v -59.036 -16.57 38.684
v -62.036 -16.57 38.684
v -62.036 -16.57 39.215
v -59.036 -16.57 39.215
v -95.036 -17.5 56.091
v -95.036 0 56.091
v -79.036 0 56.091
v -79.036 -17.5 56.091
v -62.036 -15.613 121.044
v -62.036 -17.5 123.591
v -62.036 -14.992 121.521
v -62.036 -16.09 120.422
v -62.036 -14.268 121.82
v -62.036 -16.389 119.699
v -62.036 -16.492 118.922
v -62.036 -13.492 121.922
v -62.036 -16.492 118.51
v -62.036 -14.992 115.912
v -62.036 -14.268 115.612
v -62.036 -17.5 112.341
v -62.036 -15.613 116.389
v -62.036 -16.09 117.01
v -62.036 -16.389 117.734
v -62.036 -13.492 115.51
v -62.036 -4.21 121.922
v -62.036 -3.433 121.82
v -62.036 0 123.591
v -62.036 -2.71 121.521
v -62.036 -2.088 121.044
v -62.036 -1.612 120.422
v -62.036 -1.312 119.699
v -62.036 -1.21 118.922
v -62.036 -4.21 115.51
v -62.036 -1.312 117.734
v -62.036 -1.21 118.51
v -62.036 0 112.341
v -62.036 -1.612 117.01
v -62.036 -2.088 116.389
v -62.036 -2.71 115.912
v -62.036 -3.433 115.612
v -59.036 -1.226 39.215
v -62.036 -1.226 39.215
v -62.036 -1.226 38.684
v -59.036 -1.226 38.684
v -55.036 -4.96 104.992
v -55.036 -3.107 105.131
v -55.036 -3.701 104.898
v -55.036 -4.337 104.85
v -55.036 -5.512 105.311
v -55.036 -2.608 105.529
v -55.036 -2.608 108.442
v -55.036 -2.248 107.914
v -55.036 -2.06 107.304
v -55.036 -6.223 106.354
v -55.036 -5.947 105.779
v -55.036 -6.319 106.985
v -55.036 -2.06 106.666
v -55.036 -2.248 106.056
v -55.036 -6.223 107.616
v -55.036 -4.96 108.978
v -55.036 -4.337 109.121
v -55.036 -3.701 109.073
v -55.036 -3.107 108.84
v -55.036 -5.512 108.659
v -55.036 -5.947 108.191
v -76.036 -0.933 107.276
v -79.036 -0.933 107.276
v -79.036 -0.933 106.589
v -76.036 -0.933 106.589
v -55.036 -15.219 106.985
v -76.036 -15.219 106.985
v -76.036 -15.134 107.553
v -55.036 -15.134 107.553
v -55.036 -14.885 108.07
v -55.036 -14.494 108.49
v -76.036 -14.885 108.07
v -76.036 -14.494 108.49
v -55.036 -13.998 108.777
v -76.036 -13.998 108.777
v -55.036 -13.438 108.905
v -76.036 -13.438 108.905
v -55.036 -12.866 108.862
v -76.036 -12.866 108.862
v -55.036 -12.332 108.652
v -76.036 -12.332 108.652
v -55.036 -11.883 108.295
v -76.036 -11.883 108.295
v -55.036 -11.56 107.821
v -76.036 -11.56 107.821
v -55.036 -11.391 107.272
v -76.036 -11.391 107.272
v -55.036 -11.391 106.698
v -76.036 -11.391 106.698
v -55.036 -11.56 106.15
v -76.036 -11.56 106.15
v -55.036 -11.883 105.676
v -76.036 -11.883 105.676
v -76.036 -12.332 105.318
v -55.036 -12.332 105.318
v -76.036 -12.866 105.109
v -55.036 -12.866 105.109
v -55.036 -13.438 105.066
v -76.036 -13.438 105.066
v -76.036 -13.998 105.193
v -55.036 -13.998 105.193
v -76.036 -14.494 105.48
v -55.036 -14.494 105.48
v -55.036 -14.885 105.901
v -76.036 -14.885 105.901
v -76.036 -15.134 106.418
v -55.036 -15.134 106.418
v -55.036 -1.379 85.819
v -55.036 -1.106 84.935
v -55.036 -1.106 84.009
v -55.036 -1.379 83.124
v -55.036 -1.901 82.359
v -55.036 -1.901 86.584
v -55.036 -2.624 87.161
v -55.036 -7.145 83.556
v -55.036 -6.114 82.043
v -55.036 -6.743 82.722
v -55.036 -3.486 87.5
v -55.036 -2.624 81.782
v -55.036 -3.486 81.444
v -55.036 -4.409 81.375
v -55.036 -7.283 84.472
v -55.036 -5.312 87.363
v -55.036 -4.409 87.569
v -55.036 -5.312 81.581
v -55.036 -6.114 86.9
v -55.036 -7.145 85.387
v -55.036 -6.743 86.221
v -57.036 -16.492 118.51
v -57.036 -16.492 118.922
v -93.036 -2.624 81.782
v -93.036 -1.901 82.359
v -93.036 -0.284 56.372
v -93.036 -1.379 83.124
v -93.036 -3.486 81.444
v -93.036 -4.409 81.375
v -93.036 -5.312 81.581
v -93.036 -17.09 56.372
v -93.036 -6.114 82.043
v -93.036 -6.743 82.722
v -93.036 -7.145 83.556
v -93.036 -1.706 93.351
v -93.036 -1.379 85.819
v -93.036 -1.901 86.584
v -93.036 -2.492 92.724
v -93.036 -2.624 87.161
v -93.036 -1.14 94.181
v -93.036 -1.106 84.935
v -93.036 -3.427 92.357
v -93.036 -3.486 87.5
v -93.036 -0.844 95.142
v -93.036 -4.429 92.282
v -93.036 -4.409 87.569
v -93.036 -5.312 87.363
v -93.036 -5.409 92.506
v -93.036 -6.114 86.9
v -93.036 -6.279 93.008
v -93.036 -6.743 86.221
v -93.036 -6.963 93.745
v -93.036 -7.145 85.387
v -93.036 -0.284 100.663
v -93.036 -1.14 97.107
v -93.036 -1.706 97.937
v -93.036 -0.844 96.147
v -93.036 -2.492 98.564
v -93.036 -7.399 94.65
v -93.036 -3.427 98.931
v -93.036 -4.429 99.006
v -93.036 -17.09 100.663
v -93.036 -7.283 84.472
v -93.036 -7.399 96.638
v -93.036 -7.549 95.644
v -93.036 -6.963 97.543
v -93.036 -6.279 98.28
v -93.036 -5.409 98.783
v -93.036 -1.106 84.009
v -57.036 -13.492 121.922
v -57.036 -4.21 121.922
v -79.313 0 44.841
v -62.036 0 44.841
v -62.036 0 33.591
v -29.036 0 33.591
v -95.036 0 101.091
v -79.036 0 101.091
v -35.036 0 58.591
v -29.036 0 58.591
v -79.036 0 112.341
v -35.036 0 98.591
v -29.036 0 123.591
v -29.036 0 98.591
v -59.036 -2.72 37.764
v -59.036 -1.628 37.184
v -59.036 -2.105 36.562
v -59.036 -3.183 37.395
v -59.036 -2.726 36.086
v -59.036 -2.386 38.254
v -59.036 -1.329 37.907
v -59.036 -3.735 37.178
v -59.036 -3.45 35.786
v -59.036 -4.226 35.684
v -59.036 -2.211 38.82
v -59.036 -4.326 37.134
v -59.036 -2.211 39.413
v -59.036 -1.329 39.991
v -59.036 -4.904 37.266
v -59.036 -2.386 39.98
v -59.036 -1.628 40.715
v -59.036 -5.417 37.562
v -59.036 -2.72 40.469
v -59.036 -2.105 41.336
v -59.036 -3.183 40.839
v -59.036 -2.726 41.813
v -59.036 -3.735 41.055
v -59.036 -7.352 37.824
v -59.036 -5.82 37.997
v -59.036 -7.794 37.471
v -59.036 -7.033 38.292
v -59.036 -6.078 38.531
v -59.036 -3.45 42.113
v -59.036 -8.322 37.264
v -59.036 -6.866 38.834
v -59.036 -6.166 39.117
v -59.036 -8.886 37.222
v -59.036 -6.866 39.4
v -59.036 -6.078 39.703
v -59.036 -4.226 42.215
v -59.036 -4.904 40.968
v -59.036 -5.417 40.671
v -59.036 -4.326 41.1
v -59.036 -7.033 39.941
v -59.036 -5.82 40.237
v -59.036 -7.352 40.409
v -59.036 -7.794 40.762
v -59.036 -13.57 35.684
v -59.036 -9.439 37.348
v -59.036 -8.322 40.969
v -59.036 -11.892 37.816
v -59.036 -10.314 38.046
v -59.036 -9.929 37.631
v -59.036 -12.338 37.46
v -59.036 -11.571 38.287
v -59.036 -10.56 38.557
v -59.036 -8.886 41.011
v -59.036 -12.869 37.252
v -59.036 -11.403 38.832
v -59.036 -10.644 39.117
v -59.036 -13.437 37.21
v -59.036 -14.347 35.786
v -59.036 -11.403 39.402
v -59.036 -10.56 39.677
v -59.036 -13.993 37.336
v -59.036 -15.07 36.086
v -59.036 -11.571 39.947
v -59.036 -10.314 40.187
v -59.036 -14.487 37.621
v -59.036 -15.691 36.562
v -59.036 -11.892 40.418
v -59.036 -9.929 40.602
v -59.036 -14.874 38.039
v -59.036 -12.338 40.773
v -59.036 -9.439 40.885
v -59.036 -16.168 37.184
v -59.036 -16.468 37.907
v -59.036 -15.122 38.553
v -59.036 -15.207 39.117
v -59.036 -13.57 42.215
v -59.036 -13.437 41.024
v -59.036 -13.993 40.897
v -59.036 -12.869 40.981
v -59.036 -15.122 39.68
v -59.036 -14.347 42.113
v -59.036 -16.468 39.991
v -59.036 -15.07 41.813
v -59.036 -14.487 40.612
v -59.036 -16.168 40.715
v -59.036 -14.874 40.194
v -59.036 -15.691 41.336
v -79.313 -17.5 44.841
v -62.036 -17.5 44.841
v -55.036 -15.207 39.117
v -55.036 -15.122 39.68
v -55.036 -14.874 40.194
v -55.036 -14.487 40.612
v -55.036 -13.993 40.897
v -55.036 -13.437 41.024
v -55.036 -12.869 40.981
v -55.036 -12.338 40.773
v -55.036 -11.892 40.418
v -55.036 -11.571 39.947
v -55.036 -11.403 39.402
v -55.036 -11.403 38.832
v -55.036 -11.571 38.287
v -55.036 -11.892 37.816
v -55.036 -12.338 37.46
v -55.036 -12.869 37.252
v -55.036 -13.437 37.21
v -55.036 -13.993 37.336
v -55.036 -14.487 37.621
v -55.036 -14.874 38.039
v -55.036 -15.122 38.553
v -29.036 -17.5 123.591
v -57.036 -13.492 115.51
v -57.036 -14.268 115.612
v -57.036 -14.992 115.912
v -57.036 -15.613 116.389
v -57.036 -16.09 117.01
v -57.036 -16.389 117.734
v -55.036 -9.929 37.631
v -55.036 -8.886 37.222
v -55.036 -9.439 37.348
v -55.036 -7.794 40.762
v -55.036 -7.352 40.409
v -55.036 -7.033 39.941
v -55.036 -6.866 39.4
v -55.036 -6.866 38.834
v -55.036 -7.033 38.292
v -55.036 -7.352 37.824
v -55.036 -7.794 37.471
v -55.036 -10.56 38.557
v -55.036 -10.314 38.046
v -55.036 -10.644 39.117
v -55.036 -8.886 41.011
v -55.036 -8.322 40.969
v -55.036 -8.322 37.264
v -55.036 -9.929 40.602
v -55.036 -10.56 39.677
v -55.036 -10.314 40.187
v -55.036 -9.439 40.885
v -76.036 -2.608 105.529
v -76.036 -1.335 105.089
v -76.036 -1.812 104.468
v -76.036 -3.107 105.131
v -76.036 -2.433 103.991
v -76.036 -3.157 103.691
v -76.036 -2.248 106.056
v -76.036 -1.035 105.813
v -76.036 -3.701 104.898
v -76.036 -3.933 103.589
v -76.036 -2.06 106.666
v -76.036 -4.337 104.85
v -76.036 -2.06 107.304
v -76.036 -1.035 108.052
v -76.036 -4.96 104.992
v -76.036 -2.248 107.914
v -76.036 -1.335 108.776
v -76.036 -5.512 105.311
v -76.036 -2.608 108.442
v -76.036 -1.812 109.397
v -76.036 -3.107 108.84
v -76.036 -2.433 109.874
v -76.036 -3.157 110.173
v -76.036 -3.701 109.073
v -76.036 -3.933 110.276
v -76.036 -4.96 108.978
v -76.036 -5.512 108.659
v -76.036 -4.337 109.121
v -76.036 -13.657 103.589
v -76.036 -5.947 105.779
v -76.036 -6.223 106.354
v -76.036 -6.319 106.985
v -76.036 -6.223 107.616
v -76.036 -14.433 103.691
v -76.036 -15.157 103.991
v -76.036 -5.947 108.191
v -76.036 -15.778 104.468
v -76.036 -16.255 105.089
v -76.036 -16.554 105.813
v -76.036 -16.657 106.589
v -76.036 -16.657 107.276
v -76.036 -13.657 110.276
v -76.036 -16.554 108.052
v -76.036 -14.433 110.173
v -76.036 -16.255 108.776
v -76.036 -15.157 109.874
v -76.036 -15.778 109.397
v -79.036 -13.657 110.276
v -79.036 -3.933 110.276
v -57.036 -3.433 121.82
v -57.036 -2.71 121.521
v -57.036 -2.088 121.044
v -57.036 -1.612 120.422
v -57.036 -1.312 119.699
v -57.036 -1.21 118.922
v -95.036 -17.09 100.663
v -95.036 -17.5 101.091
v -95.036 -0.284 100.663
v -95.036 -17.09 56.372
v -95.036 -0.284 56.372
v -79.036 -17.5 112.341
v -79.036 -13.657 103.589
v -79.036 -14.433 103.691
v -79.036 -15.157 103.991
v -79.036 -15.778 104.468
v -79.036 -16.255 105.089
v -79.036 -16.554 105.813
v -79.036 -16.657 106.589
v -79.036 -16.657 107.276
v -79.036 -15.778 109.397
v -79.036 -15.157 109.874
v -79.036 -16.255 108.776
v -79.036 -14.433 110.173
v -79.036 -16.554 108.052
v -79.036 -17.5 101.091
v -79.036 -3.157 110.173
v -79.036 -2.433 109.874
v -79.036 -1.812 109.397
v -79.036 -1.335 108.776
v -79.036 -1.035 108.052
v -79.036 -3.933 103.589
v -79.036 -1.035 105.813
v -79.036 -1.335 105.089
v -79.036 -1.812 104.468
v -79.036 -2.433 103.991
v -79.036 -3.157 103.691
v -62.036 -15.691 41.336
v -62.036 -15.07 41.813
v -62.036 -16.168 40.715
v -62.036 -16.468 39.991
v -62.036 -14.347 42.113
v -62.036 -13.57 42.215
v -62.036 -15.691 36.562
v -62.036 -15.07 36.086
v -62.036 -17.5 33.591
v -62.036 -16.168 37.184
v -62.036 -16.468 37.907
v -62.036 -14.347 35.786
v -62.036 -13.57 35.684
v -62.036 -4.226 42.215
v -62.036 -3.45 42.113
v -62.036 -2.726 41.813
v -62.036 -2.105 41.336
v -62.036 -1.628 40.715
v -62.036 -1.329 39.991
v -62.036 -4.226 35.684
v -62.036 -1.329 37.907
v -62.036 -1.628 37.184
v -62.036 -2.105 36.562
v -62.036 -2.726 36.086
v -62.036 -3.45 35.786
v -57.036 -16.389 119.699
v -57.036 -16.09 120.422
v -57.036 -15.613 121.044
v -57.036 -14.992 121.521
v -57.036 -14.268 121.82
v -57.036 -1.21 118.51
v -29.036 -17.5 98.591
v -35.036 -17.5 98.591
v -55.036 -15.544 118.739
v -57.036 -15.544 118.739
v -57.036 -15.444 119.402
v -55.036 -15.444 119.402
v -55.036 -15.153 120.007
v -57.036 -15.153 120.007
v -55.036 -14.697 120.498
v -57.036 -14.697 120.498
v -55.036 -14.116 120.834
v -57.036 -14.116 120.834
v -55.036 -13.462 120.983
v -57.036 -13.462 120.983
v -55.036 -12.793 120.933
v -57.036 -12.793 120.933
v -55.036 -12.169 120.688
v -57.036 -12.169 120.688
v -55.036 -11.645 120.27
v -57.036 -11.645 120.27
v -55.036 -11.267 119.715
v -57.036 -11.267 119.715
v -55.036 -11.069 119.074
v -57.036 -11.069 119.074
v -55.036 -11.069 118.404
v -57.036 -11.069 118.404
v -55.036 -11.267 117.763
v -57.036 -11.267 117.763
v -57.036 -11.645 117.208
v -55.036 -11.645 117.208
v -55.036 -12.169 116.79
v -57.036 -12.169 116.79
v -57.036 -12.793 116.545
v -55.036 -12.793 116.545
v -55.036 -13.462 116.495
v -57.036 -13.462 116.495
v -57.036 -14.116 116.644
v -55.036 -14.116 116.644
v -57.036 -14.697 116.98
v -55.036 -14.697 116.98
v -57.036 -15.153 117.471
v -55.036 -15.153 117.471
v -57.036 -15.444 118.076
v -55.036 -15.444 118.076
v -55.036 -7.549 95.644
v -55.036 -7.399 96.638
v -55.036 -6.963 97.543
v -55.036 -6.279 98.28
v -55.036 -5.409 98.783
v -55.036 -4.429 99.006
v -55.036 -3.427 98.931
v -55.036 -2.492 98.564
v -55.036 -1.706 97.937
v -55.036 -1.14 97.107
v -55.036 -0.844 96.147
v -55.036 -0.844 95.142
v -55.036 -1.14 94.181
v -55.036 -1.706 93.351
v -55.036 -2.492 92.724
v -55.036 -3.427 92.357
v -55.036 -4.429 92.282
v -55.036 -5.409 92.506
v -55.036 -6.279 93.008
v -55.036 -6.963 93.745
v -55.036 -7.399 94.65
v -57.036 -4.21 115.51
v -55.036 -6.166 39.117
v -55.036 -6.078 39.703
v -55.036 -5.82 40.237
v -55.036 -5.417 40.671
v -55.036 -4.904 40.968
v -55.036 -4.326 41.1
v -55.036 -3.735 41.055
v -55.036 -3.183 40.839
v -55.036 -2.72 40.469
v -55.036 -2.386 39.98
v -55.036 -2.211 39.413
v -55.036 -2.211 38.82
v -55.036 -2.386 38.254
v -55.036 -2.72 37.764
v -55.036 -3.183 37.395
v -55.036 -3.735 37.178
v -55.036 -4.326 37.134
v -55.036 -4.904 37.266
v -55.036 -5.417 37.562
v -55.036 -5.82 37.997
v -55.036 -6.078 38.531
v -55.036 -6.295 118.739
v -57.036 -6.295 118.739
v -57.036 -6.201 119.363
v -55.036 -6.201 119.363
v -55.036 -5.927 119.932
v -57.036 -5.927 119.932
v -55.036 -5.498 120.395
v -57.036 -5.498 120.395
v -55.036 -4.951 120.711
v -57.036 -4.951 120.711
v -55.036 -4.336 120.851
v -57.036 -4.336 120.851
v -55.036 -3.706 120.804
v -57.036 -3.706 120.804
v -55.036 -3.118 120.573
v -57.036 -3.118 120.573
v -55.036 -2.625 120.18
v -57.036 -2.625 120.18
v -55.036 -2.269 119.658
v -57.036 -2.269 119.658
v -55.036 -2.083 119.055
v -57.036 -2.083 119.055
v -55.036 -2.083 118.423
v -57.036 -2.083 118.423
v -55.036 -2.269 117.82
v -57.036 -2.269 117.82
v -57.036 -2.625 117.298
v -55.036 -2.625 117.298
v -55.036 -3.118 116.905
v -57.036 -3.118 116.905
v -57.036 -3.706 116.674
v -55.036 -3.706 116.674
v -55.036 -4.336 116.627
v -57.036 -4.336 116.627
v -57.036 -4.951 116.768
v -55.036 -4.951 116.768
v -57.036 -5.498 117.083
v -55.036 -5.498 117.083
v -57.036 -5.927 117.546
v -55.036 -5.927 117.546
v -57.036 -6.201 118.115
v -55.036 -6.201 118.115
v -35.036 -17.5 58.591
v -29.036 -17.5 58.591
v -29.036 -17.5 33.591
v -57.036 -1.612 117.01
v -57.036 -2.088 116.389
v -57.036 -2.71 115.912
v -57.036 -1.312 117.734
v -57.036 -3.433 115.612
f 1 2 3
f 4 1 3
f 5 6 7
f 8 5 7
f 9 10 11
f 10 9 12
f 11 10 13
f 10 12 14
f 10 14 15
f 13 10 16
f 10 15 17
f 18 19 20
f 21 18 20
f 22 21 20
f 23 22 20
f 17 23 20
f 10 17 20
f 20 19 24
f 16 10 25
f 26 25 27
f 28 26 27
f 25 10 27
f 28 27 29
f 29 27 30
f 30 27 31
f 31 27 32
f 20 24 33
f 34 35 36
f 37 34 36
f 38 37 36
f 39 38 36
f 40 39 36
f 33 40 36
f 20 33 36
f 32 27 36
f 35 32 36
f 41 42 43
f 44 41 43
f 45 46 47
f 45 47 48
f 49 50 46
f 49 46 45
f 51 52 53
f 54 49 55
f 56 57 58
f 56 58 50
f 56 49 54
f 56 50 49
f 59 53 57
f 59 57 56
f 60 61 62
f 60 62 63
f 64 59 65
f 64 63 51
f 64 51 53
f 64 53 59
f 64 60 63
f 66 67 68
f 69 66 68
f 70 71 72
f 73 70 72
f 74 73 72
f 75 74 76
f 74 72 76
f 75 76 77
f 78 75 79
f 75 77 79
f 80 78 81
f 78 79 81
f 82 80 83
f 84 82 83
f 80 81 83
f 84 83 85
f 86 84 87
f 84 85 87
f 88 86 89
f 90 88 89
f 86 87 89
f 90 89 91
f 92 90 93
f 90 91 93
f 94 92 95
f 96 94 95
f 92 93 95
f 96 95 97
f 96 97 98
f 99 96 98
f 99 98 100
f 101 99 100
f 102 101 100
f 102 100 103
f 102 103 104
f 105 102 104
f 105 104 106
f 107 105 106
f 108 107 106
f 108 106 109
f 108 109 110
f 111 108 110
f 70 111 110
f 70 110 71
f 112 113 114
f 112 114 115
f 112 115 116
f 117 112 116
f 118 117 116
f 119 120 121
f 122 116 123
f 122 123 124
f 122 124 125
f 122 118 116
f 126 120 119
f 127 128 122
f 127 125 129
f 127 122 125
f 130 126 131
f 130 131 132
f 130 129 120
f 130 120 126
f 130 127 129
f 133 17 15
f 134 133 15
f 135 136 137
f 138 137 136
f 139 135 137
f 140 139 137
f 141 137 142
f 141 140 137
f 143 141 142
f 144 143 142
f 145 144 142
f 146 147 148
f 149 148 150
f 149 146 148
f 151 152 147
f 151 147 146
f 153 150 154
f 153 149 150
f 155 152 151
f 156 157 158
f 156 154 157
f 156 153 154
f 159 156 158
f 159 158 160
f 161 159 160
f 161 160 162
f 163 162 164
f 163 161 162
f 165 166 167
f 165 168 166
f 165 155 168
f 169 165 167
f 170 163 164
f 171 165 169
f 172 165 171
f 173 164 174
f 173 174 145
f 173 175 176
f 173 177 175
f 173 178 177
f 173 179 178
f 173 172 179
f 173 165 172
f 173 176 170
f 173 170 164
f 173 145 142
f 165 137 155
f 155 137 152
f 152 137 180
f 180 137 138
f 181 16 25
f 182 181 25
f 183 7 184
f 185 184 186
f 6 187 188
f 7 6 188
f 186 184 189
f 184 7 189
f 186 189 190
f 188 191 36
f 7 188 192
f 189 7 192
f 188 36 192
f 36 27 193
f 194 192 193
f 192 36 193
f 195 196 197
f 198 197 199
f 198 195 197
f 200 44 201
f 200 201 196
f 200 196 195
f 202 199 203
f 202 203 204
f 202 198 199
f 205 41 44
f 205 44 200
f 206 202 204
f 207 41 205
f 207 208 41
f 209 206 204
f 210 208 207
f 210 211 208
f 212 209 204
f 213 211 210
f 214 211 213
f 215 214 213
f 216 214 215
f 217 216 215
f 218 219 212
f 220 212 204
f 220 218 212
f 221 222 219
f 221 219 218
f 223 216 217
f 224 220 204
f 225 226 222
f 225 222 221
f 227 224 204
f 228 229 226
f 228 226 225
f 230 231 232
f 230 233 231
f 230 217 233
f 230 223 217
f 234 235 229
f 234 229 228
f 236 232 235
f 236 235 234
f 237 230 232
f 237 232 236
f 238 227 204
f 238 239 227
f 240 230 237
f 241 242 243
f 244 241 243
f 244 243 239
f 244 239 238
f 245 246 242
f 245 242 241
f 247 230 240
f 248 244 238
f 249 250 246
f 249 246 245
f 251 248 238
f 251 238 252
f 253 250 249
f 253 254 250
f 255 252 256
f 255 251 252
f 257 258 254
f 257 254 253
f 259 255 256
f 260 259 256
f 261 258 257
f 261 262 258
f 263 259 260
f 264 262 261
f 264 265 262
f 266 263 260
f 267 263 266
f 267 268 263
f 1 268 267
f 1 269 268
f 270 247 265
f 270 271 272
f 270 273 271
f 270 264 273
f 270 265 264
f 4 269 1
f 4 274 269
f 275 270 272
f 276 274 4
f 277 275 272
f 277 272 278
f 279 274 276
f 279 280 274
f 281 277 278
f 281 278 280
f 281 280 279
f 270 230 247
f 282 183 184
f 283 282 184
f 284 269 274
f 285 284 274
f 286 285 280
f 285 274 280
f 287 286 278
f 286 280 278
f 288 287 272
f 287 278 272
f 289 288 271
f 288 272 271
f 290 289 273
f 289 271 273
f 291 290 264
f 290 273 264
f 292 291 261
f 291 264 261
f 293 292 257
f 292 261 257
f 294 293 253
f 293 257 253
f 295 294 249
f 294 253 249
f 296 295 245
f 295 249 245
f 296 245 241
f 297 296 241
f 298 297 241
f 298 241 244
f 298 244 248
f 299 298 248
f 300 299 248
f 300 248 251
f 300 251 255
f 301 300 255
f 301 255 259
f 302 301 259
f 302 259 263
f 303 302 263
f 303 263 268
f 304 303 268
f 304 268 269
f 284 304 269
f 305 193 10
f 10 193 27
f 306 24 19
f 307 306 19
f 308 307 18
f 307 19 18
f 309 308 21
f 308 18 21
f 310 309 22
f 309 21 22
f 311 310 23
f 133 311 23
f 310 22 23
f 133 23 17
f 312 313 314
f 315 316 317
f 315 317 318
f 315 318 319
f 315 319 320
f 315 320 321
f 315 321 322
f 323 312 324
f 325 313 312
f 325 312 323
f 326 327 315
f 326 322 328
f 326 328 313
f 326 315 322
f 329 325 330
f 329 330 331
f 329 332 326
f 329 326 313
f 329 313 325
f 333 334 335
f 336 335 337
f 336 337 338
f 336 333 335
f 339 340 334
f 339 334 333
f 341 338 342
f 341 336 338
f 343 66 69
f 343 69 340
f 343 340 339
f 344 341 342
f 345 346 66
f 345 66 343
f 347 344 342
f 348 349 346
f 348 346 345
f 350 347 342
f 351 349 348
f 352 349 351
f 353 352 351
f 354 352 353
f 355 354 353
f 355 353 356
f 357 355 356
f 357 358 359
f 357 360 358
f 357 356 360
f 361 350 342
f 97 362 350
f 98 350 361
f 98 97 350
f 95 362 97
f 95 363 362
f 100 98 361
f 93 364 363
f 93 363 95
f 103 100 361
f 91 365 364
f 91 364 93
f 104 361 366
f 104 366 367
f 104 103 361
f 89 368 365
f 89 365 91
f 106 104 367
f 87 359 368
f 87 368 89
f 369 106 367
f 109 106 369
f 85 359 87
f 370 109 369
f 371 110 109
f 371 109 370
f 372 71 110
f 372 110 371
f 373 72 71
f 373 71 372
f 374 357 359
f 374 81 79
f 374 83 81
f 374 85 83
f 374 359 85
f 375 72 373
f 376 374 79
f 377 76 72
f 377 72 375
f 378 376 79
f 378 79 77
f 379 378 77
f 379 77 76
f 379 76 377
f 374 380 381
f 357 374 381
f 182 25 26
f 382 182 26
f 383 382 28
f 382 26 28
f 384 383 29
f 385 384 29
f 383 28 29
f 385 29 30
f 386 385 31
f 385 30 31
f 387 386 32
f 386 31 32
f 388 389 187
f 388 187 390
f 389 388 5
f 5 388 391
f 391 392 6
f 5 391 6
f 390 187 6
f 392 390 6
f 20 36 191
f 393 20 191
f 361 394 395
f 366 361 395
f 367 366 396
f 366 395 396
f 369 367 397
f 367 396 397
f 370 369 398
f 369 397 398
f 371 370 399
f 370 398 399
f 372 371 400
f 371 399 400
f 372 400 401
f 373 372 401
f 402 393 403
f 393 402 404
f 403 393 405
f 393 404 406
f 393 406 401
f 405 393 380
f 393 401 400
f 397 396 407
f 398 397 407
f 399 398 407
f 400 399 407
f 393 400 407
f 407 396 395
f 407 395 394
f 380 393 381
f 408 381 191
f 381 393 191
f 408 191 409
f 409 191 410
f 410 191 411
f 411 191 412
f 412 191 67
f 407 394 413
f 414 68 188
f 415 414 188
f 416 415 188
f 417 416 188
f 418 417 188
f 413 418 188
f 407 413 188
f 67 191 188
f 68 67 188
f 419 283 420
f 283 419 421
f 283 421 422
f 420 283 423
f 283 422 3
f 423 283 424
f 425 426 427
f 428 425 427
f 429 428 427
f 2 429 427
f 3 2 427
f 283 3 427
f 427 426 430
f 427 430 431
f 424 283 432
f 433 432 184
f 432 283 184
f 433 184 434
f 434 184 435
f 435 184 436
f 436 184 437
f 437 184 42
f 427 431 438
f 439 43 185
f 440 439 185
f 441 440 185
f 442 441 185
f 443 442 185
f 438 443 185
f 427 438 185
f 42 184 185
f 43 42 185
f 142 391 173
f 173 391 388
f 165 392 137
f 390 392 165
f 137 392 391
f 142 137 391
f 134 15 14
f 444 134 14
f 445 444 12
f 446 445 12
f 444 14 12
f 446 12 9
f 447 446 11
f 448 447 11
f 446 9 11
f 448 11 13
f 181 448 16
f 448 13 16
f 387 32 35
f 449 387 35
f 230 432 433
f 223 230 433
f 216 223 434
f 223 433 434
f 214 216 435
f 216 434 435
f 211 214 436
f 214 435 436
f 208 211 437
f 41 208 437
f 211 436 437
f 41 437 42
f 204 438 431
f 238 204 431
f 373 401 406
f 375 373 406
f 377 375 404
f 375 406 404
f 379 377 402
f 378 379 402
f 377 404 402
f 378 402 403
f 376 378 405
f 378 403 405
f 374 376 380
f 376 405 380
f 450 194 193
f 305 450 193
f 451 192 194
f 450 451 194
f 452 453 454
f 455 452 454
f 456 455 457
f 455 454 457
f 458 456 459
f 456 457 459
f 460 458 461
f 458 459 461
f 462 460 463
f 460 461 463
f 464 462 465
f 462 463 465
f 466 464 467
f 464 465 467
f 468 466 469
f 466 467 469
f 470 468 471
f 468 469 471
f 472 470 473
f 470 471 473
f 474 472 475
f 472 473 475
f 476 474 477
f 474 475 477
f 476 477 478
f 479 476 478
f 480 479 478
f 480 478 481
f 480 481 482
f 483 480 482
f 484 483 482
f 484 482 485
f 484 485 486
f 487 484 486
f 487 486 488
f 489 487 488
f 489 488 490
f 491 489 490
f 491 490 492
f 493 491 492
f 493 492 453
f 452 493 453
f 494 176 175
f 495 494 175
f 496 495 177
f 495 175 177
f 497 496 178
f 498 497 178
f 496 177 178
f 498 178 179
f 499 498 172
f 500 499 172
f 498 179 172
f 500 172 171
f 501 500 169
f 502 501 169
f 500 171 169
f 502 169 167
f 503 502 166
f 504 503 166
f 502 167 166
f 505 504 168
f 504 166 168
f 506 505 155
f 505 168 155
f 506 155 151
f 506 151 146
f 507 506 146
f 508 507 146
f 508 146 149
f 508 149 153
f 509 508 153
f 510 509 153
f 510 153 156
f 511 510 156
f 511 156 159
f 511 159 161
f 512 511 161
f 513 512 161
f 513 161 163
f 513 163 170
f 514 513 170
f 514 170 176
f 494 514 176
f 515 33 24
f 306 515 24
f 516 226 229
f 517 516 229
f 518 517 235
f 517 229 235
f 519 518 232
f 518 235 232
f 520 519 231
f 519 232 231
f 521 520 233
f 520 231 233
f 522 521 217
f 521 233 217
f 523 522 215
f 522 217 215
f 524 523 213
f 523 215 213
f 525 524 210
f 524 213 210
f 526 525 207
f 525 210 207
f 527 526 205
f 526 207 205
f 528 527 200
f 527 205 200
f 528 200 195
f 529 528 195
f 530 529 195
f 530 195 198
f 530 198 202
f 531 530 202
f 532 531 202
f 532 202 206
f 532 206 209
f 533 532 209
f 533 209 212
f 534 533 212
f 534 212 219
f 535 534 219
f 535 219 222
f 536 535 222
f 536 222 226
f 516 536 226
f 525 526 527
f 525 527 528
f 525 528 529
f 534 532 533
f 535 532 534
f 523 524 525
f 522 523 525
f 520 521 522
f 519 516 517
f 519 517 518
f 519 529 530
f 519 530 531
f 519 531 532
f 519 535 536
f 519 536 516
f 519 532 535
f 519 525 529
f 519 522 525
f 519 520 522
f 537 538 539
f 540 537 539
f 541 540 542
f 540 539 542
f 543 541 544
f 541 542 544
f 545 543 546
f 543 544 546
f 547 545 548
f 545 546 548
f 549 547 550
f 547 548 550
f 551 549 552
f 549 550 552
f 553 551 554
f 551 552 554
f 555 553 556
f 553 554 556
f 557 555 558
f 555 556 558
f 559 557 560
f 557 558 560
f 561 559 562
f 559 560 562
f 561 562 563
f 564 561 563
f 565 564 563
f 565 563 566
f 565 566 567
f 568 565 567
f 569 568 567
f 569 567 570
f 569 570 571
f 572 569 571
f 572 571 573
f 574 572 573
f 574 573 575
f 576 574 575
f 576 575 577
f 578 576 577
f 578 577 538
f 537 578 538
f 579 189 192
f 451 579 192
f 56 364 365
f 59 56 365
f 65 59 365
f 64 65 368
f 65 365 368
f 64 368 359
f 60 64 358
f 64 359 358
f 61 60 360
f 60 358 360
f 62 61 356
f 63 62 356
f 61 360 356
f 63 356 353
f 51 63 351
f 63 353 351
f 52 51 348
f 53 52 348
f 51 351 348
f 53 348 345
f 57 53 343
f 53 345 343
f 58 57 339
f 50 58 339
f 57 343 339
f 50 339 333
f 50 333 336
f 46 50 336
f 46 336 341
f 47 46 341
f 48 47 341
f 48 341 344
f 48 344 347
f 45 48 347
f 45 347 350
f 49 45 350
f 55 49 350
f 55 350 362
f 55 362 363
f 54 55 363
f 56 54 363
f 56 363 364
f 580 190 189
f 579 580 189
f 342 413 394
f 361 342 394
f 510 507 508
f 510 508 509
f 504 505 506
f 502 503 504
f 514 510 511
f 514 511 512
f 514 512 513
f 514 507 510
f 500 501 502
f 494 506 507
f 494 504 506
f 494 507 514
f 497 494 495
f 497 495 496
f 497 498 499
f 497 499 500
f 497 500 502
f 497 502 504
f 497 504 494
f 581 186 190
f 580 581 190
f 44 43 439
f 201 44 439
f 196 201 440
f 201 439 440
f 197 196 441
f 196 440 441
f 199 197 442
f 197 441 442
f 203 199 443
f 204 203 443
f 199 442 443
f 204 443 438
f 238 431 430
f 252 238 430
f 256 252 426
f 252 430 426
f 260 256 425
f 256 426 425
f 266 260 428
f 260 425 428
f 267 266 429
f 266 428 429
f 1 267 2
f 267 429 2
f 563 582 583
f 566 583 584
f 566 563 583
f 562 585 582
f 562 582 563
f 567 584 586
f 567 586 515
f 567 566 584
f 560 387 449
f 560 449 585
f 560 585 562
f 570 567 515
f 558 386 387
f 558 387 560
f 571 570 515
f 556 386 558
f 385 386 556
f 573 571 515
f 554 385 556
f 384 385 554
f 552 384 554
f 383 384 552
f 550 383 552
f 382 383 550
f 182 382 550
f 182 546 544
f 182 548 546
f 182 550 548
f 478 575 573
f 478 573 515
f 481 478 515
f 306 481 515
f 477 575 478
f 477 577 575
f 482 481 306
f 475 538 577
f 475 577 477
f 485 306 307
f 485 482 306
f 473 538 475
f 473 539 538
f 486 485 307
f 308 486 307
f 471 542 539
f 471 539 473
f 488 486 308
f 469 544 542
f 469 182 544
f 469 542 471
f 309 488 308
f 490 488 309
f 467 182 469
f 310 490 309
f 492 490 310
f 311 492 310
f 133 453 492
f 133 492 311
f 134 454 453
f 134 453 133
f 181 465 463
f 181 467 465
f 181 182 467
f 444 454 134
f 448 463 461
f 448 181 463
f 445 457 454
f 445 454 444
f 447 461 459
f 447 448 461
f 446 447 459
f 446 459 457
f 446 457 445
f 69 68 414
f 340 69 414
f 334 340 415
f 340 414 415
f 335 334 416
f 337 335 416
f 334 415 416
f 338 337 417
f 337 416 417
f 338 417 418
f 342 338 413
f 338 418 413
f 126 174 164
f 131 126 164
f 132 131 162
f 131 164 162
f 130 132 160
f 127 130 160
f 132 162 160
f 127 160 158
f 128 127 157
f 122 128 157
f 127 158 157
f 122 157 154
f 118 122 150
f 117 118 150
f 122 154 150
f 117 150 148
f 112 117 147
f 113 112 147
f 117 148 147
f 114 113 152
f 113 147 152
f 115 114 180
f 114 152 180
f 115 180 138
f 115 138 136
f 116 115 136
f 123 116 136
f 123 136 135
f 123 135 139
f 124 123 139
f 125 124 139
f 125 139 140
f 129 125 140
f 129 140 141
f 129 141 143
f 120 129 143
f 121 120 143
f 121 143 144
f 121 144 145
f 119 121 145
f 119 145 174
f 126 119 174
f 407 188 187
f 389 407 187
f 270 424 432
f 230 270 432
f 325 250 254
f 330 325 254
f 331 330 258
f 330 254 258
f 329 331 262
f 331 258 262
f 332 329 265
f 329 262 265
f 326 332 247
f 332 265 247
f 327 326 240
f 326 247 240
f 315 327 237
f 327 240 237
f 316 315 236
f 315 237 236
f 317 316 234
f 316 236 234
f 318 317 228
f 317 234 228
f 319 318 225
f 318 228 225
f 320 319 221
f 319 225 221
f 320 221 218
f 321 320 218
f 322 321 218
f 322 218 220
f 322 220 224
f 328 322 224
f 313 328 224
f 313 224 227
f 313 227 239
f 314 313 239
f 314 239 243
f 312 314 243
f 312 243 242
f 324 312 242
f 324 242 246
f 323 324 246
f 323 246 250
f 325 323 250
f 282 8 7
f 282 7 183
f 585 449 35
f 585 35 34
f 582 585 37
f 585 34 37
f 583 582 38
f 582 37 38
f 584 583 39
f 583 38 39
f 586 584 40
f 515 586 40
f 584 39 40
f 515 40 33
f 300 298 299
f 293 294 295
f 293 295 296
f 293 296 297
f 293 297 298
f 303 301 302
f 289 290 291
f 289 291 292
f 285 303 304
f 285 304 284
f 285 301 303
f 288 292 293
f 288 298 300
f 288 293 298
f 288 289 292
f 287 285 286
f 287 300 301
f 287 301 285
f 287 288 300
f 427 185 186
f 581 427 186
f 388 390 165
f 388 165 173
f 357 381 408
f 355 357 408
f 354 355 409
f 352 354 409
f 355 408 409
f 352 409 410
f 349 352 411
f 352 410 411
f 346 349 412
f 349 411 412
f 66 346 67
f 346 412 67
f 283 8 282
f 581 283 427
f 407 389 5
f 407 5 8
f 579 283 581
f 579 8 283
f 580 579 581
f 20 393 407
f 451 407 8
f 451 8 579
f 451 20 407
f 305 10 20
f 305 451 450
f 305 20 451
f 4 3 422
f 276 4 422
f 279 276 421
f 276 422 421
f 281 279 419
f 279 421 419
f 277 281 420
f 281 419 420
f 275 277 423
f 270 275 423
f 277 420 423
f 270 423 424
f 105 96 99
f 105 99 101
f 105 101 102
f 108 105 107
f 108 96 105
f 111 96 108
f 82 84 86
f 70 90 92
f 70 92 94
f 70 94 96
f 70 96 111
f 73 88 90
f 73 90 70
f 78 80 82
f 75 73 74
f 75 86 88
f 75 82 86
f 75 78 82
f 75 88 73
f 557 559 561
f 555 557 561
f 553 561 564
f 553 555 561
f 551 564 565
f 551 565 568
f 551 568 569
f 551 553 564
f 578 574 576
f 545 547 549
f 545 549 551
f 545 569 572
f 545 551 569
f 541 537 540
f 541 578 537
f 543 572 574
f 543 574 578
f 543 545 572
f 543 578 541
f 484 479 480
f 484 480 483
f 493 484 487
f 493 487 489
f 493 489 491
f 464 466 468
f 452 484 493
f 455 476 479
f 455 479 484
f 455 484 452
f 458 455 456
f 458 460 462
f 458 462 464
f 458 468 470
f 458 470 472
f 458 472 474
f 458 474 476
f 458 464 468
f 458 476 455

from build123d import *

# Parameters (mm, degrees)
F1_DEPTH  = 17.5
F2_R      = 2.25021
F2_R_2    = 2.117892
F2_R_3    = 2.141219
F2_R_4    = 1.925027
F2_R_5    = 3.371511
F2_R_6    = 3.105781
F2_R_7    = 1.98861
F2_R_8    = 1.899979
F2_R_9    = 1.912547
F3_DEPTH  = 40
F4_R      = 2.117892
F4_R_2    = 2.25021
F5_DEPTH  = 5
F6_R      = 2.141219
F6_R_2    = 1.925027
F7_DEPTH  = 3
F9_DEPTH  = 3
F10_W     = 16.805832
F10_H     = 44.291496
F10_R     = 3.105781
F10_R_2   = 3.371511
F11_DEPTH = 2


with BuildPart() as f1:
    # F0 (on Front) → F1 (new body)
    with BuildSketch(Plane.XZ):
        Polygon((-29.036315, 123.591392), (-62.036315, 123.591392), (-62.036315, 112.341392), (-79.036315, 112.341392), (-79.036315, 101.091392), (-95.036315, 101.091392), (-95.036315, 56.091392), (-79.036315, 56.091392), (-79.313149, 44.841392), (-62.036315, 44.841392), (-62.036315, 33.591392), (-29.036315, 33.591392), (-29.036315, 58.591392), (-35.036315, 58.591392), (-35.036315, 98.591392), (-29.036315, 98.591392), align=None)
    extrude(amount=F1_DEPTH)

    # F2 (on face) → F3 (cut)
    with BuildSketch(Plane(origin=(-95.036315, 0, 0), x_dir=(0, -1, 0), z_dir=(-1, 0, 0))):
        with Locations((13.294209, 118.739031)):
            Circle(F2_R)
        with Locations((4.177382, 118.739031)):
            Circle(F2_R_2)
        with Locations((4.177382, 106.985271)):
            Circle(F2_R_3)
        with Locations((13.294209, 106.985271)):
            Circle(F2_R_4)
        with Locations((4.177382, 95.644102)):
            Circle(F2_R_5)
        with Locations((4.177382, 84.471688)):
            Circle(F2_R_6)
        with Locations((4.177382, 39.11674)):
            Circle(F2_R_7)
        with Locations((8.744364, 39.11674)):
            Circle(F2_R_8)
        with Locations((13.294209, 39.11674)):
            Circle(F2_R_9)
    extrude(amount=-F3_DEPTH, mode=Mode.SUBTRACT)

    # F4 (on face) → F5 (cut)
    with BuildSketch(Plane(origin=(-62.036315, 0, 0), x_dir=(0, -1, 0), z_dir=(-1, 0, 0))):
        with BuildLine():
            Line((13.491717, 121.922452), (4.209779, 121.922452))
            ThreePointArc((4.209779, 121.922452), (2.088459, 121.043773), (1.209779, 118.922452))
            Line((1.209779, 118.922452), (1.209779, 118.510082))
            ThreePointArc((1.209779, 118.510082), (2.088459, 116.388762), (4.209779, 115.510082))
            Line((4.209779, 115.510082), (13.491717, 115.510082))
            ThreePointArc((13.491717, 115.510082), (15.613037, 116.388762), (16.491717, 118.510082))
            Line((16.491717, 118.510082), (16.491717, 118.922452))
            ThreePointArc((16.491717, 118.922452), (15.613037, 121.043773), (13.491717, 121.922452))
        make_face()
        with Locations((4.177382, 118.739031)):
            Circle(F4_R, mode=Mode.SUBTRACT)
        with Locations((13.294209, 118.739031)):
            Circle(F4_R_2, mode=Mode.SUBTRACT)
    extrude(amount=-F5_DEPTH, mode=Mode.SUBTRACT)

    # F6 (on face) → F7 (cut)
    with BuildSketch(Plane(origin=(-79.036315, 0, 0), x_dir=(0, -1, 0), z_dir=(-1, 0, 0))):
        with BuildLine():
            Line((13.656557, 110.275699), (3.933159, 110.275699))
            ThreePointArc((3.933159, 110.275699), (1.811838, 109.397019), (0.933159, 107.275699))
            Line((0.933159, 107.275699), (0.933159, 106.589088))
            ThreePointArc((0.933159, 106.589088), (1.811838, 104.467767), (3.933159, 103.589088))
            Line((3.933159, 103.589088), (13.656557, 103.589088))
            ThreePointArc((13.656557, 103.589088), (15.777877, 104.467767), (16.656557, 106.589088))
            Line((16.656557, 106.589088), (16.656557, 107.275699))
            ThreePointArc((16.656557, 107.275699), (15.777877, 109.397019), (13.656557, 110.275699))
        make_face()
        with Locations((4.177382, 106.985271)):
            Circle(F6_R, mode=Mode.SUBTRACT)
        with Locations((13.294209, 106.985271)):
            Circle(F6_R_2, mode=Mode.SUBTRACT)
    extrude(amount=-F7_DEPTH, mode=Mode.SUBTRACT)

    # F8 (on face) → F9 (cut)
    with BuildSketch(Plane(origin=(-62.036315, 0, 0), x_dir=(0, -1, 0), z_dir=(-1, 0, 0))):
        with BuildLine():
            ThreePointArc((1.226484, 38.683788), (2.105164, 36.562468), (4.226484, 35.683788))
            Line((4.226484, 35.683788), (13.570151, 35.683788))
            ThreePointArc((13.570151, 35.683788), (15.691471, 36.562468), (16.570151, 38.683788))
            Line((16.570151, 38.683788), (16.570151, 39.214782))
            ThreePointArc((16.570151, 39.214782), (15.691471, 41.336103), (13.570151, 42.214782))
            Line((13.570151, 42.214782), (4.226484, 42.214782))
            ThreePointArc((4.226484, 42.214782), (2.105164, 41.336103), (1.226484, 39.214782))
            Line((1.226484, 39.214782), (1.226484, 38.683788))
        make_face()
    extrude(amount=-F9_DEPTH, mode=Mode.SUBTRACT)

    # F10 (on face) → F11 (cut)
    with BuildSketch(Plane(origin=(-95.036315, 0, 0), x_dir=(0, -1, 0), z_dir=(-1, 0, 0))):
        with Locations((8.686814, 78.51769)):
            Rectangle(F10_W, F10_H)
        with Locations((4.177382, 84.471688)):
            Circle(F10_R, mode=Mode.SUBTRACT)
        with Locations((4.177382, 95.644102)):
            Circle(F10_R_2, mode=Mode.SUBTRACT)
    extrude(amount=-F11_DEPTH, mode=Mode.SUBTRACT)


solid = f1.part
